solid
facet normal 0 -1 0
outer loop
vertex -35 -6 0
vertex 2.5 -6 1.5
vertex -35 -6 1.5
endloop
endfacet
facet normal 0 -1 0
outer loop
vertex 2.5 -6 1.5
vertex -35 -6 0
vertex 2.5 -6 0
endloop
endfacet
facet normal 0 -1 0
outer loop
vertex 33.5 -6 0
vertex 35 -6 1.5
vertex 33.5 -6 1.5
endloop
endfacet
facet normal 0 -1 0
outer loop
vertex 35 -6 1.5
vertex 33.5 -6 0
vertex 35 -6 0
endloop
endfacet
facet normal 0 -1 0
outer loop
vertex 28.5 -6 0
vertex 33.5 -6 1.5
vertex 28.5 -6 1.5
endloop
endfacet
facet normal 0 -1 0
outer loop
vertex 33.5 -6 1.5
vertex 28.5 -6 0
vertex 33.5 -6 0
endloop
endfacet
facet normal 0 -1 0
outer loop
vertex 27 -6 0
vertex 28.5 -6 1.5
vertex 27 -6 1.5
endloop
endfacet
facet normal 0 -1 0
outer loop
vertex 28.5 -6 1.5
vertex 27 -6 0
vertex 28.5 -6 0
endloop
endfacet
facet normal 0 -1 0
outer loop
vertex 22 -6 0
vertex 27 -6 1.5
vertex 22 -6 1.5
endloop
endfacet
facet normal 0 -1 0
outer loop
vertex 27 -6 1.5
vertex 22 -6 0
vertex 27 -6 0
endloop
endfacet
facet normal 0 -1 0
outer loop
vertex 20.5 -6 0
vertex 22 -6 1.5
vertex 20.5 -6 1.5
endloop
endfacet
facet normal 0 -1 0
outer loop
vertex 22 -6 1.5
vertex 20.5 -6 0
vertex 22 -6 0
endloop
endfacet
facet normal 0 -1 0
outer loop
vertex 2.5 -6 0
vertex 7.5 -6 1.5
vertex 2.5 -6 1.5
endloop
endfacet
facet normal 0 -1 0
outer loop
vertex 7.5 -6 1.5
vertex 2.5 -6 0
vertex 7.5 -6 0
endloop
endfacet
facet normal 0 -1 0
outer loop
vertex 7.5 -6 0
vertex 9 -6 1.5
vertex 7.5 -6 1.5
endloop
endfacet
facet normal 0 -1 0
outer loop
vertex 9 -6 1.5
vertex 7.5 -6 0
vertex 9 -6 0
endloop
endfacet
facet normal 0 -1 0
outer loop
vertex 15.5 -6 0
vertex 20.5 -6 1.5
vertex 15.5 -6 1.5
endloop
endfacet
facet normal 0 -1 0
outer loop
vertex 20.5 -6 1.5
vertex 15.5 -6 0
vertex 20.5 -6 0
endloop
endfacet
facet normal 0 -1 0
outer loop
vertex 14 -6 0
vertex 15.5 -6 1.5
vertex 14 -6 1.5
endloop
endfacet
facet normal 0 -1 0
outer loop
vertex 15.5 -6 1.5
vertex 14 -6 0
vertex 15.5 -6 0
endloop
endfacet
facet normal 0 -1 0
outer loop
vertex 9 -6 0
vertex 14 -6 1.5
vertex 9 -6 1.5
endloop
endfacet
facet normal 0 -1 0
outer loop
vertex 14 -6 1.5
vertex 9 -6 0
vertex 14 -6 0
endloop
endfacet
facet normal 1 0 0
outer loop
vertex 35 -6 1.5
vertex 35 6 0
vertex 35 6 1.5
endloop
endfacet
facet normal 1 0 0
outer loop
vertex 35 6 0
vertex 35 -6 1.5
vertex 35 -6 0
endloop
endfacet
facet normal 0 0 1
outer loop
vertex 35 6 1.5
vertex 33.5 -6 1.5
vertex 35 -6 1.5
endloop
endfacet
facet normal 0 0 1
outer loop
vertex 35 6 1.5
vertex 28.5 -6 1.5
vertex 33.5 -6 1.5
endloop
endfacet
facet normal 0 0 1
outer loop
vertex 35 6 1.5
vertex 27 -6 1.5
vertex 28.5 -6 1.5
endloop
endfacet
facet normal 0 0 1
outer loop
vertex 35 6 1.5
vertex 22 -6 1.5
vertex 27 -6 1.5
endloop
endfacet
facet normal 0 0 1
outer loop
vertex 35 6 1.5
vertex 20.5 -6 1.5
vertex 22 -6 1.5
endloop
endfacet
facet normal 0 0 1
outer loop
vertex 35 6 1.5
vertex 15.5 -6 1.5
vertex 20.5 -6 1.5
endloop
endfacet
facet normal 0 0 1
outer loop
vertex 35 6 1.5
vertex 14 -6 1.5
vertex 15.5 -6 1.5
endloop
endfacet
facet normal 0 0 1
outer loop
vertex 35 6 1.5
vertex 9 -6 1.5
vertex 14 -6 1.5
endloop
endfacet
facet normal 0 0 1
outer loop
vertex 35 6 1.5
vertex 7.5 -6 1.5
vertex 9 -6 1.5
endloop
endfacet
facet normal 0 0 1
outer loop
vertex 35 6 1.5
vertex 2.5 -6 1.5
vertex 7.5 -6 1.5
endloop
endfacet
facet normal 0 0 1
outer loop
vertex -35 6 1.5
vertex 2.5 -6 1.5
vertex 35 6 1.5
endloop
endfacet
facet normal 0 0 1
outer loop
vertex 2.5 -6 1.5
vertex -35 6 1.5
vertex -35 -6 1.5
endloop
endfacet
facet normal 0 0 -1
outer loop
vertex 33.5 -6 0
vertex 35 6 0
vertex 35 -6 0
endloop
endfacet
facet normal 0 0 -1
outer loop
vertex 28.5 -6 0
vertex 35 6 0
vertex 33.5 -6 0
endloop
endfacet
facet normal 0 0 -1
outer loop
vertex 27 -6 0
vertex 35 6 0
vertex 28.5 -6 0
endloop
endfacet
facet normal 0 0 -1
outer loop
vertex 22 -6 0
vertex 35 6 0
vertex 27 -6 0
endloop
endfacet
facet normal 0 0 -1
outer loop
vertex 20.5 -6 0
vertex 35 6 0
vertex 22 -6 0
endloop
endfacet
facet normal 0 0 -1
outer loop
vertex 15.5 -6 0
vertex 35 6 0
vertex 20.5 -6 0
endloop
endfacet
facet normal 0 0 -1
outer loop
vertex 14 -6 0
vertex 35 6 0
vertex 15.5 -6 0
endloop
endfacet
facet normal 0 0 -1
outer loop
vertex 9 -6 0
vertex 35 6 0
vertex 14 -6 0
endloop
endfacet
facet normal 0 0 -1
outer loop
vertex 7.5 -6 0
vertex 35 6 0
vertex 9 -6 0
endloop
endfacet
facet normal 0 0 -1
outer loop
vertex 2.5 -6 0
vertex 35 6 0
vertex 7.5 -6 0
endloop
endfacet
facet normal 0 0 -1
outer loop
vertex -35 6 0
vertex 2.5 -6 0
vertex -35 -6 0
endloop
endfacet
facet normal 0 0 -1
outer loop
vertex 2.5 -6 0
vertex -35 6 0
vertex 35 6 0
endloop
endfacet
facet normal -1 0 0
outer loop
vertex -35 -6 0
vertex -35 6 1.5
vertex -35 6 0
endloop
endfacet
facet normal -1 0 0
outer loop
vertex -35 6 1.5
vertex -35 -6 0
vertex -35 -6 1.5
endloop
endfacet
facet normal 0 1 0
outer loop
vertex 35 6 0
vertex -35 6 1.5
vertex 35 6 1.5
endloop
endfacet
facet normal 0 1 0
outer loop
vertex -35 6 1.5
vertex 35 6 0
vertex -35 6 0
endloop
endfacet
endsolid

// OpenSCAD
// Agarose gel comb - a flat plate with a spine and a row of rectangular teeth for casting
// horizontal gels. NOVEL general part (a generic comb, not for any one lab).
//

plate_z = 1.5;
spine_l = 70;
spine_w = 12;
teeth_n = 10;
tooth_w = 5.0;
tooth_d = 12;
gap    = 1.5;

$fn = 48;

teeth_x_pitch = tooth_w + gap;
row_length    = teeth_n * teeth_x_pitch;
start_x       = (spine_l - row_length) / 2;

difference() {
    translate([-spine_l / 2, -spine_w / 2, 0]) cube([spine_l, spine_w, plate_z]);
    for (i = [0 : teeth_n - 1])
        translate([start_x + i * teeth_x_pitch, -spine_w / 2 - tooth_d, 0])
            cube([tooth_w, tooth_d, plate_z]);
}
